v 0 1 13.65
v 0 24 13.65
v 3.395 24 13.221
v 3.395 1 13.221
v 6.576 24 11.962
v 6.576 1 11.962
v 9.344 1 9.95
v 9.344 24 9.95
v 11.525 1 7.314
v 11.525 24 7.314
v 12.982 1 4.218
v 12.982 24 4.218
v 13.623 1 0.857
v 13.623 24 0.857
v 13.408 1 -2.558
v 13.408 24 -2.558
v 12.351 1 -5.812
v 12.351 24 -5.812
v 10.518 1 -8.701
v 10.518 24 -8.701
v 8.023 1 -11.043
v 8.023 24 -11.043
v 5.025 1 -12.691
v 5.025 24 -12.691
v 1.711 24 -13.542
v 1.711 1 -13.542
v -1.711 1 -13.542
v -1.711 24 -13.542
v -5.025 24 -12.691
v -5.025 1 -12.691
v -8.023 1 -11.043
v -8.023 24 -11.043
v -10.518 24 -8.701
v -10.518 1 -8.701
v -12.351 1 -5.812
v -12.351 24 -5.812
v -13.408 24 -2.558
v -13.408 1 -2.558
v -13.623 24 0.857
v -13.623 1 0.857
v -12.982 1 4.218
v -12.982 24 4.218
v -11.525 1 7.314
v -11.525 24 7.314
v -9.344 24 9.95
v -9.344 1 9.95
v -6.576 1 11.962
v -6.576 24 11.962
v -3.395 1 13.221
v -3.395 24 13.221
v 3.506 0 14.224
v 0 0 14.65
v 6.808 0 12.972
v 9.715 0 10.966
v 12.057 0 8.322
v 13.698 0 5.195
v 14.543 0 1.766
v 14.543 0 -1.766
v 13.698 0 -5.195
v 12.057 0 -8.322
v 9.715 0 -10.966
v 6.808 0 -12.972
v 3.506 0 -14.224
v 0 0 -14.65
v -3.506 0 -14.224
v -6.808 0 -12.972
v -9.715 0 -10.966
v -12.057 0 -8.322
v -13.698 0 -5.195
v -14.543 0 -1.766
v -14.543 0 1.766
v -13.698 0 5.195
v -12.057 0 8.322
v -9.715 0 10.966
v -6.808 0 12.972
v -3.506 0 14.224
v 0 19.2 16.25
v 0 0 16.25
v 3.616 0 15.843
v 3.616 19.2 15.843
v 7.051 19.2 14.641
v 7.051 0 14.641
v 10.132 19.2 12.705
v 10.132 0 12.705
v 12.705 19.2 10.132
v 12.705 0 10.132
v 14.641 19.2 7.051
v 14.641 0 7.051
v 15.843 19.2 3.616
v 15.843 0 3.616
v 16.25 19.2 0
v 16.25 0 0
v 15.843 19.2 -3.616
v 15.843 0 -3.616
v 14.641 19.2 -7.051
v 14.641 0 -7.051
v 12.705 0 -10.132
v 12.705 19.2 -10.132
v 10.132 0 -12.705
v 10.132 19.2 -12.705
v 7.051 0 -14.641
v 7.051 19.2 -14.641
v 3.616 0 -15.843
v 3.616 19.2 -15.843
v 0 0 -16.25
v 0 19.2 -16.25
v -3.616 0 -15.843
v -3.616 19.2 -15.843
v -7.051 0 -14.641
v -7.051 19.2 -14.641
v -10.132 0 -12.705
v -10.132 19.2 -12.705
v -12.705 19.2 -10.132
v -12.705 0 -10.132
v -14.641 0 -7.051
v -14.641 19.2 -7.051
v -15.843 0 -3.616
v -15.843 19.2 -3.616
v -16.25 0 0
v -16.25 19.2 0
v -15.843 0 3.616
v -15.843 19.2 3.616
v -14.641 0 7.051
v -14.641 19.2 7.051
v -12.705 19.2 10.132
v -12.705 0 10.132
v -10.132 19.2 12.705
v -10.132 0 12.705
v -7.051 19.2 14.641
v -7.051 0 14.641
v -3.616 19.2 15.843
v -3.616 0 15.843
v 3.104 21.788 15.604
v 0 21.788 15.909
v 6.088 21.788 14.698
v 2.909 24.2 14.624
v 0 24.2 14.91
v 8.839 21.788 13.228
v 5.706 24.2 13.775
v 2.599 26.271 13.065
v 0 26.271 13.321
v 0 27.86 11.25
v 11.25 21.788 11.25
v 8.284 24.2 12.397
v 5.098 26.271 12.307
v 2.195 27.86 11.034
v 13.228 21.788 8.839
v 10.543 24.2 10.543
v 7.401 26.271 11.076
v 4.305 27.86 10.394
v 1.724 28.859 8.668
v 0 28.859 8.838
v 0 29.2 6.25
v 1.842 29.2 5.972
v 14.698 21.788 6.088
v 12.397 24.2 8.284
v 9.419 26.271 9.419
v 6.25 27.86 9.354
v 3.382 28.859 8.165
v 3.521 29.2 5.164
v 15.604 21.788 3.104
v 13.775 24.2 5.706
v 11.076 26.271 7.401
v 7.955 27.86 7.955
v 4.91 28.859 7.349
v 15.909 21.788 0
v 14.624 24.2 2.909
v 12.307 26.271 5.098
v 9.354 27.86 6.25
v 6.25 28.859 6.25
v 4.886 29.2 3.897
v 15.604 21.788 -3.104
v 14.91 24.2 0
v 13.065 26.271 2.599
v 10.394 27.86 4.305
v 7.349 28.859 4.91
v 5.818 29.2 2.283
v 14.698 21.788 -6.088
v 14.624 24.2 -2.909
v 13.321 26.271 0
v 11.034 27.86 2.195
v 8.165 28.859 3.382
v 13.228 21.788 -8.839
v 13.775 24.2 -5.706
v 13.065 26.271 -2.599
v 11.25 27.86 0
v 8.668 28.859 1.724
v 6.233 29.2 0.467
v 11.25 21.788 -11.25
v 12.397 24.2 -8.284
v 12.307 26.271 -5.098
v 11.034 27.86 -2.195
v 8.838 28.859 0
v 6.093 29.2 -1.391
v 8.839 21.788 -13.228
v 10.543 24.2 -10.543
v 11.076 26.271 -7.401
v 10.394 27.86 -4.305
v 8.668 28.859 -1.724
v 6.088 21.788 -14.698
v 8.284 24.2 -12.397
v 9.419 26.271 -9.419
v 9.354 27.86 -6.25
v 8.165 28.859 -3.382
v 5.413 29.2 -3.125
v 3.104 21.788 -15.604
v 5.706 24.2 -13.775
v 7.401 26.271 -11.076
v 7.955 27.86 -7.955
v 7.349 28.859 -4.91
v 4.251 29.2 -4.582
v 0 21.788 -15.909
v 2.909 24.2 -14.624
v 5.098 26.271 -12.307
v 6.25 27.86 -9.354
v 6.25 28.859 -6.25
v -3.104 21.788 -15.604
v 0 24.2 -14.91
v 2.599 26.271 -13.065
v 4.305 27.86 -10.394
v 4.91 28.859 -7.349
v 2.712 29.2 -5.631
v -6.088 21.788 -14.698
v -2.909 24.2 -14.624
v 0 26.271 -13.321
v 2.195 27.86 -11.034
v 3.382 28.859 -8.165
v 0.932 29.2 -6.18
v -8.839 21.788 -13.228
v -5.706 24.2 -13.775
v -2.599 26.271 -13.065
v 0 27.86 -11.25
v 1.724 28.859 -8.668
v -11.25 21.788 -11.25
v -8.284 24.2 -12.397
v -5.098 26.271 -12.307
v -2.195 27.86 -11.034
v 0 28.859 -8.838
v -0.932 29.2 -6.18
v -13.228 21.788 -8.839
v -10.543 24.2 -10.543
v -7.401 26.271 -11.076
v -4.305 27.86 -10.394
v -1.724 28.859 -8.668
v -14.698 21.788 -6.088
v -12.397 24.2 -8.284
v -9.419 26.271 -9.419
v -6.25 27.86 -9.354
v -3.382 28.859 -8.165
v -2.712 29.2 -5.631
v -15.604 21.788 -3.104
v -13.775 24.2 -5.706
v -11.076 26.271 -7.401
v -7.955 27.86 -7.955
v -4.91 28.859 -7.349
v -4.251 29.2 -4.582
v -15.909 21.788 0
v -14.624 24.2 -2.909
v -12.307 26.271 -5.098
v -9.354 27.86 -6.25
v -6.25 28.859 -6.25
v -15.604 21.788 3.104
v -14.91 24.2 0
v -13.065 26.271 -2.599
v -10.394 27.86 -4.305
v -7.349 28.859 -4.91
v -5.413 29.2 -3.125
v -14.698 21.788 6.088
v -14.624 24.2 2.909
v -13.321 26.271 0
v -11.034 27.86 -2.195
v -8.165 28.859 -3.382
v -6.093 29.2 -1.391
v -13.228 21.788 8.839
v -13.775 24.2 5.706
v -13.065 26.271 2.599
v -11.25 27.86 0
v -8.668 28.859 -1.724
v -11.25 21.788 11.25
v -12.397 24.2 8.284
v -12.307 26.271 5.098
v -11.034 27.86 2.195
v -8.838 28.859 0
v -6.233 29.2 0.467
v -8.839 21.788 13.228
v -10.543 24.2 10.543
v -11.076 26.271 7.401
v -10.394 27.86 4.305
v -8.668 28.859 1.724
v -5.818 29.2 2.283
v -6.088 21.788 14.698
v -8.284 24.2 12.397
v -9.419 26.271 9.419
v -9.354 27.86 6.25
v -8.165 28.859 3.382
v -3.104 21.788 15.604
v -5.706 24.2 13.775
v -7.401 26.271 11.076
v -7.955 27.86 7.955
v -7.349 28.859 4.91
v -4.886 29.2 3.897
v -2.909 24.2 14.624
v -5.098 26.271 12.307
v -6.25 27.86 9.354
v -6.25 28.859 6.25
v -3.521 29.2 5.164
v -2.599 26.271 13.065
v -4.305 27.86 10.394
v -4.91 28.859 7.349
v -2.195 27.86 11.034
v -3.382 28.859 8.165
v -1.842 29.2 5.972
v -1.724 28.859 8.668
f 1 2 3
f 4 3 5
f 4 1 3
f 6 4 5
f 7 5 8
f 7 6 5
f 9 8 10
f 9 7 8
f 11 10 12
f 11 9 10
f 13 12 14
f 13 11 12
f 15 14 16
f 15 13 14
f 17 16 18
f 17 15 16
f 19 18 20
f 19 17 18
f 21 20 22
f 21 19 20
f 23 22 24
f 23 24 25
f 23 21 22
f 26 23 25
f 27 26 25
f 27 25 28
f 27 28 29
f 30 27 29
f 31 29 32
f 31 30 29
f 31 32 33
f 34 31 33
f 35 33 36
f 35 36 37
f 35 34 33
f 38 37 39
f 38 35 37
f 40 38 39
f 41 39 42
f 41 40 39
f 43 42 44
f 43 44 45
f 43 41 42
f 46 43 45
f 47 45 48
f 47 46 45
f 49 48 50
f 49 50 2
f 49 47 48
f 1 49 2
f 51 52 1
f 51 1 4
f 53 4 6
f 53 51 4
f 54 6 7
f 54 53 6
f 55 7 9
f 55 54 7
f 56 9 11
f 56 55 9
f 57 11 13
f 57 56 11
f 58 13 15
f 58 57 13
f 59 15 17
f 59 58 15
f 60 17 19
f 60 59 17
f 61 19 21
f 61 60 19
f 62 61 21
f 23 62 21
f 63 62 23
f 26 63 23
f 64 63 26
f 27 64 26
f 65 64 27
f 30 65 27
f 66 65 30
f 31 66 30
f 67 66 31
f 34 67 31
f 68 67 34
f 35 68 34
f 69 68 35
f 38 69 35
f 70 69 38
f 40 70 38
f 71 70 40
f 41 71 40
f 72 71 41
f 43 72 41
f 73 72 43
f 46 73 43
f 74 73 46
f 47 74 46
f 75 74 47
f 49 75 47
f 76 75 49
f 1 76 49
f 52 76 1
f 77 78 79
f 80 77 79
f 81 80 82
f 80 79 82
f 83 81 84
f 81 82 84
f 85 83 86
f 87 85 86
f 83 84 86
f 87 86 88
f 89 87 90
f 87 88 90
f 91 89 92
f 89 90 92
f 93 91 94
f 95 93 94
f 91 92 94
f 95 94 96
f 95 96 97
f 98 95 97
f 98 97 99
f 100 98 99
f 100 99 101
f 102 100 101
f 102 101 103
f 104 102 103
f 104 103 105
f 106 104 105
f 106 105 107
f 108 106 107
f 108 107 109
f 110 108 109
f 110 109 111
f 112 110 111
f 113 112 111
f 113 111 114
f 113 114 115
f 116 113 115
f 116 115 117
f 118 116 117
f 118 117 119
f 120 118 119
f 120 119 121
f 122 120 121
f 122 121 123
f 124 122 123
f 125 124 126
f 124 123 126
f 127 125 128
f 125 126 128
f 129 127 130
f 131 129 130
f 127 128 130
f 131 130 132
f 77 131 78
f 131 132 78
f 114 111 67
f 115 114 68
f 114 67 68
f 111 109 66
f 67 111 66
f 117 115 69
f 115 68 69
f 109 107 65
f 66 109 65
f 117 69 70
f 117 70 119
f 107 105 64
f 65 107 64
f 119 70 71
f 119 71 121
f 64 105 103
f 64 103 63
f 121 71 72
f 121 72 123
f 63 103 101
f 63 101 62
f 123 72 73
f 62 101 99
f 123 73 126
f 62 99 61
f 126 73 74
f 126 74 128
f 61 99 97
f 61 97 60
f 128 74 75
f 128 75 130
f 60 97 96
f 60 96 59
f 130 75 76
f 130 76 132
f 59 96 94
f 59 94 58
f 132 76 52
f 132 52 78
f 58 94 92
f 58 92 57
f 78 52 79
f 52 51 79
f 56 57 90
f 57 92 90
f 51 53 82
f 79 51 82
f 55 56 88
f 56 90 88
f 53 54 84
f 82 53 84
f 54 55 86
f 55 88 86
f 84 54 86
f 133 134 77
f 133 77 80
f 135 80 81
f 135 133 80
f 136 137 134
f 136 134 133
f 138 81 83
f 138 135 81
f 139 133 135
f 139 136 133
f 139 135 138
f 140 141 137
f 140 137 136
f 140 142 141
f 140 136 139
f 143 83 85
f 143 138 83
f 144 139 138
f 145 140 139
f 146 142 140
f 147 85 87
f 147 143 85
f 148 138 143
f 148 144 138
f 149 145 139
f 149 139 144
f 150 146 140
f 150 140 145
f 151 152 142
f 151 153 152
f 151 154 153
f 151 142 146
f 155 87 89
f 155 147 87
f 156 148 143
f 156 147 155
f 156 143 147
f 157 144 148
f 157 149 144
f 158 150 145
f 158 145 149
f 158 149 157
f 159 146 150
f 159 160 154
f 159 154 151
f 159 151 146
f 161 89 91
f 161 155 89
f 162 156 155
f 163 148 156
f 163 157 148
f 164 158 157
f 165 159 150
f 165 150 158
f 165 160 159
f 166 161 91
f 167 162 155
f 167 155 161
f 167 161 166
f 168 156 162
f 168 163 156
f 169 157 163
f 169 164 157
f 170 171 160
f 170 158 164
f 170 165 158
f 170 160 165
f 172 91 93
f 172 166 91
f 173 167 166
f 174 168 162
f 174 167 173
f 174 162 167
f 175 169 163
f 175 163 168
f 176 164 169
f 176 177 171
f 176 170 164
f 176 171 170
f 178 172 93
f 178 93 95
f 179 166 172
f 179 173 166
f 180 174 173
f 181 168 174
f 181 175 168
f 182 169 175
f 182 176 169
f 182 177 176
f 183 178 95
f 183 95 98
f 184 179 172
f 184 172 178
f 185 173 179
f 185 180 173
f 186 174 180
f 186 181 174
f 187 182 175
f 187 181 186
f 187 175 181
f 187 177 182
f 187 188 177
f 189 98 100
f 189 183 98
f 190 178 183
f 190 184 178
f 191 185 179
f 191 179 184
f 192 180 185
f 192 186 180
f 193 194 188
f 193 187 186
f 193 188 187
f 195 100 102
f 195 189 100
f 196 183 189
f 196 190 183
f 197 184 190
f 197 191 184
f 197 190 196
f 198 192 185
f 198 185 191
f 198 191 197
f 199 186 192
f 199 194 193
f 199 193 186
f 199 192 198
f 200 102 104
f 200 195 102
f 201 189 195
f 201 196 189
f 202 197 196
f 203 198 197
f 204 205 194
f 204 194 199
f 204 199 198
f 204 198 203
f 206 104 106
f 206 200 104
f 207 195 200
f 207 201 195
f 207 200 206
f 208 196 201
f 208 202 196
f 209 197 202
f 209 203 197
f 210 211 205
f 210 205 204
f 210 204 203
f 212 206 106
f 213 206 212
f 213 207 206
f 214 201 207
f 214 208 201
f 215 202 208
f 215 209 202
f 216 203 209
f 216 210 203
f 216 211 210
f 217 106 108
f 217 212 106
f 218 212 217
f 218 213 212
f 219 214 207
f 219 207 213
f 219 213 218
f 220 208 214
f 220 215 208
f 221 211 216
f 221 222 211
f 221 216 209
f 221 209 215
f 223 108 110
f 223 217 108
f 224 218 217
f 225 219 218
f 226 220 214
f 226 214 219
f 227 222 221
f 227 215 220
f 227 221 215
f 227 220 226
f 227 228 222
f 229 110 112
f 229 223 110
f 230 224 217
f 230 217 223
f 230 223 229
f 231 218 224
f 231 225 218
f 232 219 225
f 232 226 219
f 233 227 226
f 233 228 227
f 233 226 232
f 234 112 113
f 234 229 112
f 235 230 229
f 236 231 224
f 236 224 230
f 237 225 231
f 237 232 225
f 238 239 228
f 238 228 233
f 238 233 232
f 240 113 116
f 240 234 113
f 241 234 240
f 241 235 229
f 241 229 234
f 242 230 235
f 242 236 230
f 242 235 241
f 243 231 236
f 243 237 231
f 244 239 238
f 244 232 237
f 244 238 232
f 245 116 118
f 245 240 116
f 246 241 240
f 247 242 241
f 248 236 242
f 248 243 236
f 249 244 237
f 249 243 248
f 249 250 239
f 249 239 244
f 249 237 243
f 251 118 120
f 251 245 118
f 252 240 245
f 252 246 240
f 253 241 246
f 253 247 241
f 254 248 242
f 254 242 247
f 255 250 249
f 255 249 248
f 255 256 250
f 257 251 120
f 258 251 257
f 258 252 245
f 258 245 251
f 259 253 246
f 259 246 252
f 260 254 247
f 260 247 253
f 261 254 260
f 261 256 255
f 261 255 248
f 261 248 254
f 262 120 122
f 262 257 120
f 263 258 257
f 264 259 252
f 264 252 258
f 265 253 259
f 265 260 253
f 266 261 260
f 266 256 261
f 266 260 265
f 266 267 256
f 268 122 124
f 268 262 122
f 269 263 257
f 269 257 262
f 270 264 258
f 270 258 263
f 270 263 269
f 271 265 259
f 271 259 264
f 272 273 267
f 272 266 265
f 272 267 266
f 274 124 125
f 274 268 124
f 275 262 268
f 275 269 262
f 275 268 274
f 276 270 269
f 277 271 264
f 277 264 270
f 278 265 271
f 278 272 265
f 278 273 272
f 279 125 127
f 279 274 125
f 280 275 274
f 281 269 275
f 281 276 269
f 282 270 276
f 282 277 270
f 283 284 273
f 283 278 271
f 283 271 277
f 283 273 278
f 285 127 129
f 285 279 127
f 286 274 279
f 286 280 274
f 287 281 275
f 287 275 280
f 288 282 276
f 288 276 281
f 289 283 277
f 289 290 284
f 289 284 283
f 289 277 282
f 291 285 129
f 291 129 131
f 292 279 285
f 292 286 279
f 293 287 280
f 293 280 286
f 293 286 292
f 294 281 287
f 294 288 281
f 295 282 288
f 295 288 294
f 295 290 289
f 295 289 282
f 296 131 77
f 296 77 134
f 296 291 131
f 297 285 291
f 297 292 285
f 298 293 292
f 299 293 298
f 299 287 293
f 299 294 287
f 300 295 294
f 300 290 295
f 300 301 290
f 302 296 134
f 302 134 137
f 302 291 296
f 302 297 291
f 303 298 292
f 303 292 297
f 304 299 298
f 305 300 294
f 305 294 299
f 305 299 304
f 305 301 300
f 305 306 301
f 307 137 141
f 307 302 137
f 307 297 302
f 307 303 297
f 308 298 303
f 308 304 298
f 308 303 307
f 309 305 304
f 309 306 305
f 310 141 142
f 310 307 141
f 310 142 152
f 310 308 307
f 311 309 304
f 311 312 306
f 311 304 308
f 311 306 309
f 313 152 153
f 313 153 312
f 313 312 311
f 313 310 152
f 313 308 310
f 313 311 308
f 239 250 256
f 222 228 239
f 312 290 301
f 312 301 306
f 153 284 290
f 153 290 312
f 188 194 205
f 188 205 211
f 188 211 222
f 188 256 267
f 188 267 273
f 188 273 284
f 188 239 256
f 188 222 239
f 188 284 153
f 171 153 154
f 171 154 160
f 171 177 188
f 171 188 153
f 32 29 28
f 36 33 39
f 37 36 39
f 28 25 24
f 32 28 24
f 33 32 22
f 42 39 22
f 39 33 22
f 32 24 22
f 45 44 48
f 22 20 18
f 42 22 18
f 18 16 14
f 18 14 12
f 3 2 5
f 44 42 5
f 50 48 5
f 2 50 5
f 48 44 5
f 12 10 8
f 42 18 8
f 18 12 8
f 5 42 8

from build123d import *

# Parameters (mm, degrees)
SKETCH1_R           = 16.25
SKETCH1_R_2         = 13.65
BOSS_EXTRUDE1_DEPTH = 24
CHAMFER1_SIZE       = 1
SKETCH3_R           = 16.25
BOSS_EXTRUDE3_DEPTH = 5.2
FILLET3_R           = 10


with BuildPart() as part:
    # Sketch1 → Boss-Extrude1 (new body)
    with BuildSketch(Plane(origin=(0, 0, 0), x_dir=(1, 0, 0), z_dir=(0, 1, 0))):
        with Locations(Location((0, 0, 0), (0, 0, 270))):
            Circle(SKETCH1_R)
        with Locations(Location((0, 0, 0), (0, 0, 270))):
            Circle(SKETCH1_R_2, mode=Mode.SUBTRACT)
    extrude(amount=BOSS_EXTRUDE1_DEPTH)

    # Chamfer1
    chamfer1_edges = [part.edges().sort_by_distance(p)[0] for p in [
        (0, 0, -13.65),
    ]]
    chamfer(chamfer1_edges, length=CHAMFER1_SIZE)

    # Sketch3 → Boss-Extrude3 (add)
    with BuildSketch(Plane(origin=(0, 24, 0), x_dir=(1, 0, 0), z_dir=(0, 1, 0))):
        with Locations(Location((0, 0, 0), (0, 0, 270))):
            Circle(SKETCH3_R)
    extrude(amount=BOSS_EXTRUDE3_DEPTH)

    # Fillet3
    fillet3_edges = [part.edges().sort_by_distance(p)[0] for p in [
        (0, 29.2, -16.25),
    ]]
    fillet(fillet3_edges, radius=FILLET3_R)


solid = part.part
